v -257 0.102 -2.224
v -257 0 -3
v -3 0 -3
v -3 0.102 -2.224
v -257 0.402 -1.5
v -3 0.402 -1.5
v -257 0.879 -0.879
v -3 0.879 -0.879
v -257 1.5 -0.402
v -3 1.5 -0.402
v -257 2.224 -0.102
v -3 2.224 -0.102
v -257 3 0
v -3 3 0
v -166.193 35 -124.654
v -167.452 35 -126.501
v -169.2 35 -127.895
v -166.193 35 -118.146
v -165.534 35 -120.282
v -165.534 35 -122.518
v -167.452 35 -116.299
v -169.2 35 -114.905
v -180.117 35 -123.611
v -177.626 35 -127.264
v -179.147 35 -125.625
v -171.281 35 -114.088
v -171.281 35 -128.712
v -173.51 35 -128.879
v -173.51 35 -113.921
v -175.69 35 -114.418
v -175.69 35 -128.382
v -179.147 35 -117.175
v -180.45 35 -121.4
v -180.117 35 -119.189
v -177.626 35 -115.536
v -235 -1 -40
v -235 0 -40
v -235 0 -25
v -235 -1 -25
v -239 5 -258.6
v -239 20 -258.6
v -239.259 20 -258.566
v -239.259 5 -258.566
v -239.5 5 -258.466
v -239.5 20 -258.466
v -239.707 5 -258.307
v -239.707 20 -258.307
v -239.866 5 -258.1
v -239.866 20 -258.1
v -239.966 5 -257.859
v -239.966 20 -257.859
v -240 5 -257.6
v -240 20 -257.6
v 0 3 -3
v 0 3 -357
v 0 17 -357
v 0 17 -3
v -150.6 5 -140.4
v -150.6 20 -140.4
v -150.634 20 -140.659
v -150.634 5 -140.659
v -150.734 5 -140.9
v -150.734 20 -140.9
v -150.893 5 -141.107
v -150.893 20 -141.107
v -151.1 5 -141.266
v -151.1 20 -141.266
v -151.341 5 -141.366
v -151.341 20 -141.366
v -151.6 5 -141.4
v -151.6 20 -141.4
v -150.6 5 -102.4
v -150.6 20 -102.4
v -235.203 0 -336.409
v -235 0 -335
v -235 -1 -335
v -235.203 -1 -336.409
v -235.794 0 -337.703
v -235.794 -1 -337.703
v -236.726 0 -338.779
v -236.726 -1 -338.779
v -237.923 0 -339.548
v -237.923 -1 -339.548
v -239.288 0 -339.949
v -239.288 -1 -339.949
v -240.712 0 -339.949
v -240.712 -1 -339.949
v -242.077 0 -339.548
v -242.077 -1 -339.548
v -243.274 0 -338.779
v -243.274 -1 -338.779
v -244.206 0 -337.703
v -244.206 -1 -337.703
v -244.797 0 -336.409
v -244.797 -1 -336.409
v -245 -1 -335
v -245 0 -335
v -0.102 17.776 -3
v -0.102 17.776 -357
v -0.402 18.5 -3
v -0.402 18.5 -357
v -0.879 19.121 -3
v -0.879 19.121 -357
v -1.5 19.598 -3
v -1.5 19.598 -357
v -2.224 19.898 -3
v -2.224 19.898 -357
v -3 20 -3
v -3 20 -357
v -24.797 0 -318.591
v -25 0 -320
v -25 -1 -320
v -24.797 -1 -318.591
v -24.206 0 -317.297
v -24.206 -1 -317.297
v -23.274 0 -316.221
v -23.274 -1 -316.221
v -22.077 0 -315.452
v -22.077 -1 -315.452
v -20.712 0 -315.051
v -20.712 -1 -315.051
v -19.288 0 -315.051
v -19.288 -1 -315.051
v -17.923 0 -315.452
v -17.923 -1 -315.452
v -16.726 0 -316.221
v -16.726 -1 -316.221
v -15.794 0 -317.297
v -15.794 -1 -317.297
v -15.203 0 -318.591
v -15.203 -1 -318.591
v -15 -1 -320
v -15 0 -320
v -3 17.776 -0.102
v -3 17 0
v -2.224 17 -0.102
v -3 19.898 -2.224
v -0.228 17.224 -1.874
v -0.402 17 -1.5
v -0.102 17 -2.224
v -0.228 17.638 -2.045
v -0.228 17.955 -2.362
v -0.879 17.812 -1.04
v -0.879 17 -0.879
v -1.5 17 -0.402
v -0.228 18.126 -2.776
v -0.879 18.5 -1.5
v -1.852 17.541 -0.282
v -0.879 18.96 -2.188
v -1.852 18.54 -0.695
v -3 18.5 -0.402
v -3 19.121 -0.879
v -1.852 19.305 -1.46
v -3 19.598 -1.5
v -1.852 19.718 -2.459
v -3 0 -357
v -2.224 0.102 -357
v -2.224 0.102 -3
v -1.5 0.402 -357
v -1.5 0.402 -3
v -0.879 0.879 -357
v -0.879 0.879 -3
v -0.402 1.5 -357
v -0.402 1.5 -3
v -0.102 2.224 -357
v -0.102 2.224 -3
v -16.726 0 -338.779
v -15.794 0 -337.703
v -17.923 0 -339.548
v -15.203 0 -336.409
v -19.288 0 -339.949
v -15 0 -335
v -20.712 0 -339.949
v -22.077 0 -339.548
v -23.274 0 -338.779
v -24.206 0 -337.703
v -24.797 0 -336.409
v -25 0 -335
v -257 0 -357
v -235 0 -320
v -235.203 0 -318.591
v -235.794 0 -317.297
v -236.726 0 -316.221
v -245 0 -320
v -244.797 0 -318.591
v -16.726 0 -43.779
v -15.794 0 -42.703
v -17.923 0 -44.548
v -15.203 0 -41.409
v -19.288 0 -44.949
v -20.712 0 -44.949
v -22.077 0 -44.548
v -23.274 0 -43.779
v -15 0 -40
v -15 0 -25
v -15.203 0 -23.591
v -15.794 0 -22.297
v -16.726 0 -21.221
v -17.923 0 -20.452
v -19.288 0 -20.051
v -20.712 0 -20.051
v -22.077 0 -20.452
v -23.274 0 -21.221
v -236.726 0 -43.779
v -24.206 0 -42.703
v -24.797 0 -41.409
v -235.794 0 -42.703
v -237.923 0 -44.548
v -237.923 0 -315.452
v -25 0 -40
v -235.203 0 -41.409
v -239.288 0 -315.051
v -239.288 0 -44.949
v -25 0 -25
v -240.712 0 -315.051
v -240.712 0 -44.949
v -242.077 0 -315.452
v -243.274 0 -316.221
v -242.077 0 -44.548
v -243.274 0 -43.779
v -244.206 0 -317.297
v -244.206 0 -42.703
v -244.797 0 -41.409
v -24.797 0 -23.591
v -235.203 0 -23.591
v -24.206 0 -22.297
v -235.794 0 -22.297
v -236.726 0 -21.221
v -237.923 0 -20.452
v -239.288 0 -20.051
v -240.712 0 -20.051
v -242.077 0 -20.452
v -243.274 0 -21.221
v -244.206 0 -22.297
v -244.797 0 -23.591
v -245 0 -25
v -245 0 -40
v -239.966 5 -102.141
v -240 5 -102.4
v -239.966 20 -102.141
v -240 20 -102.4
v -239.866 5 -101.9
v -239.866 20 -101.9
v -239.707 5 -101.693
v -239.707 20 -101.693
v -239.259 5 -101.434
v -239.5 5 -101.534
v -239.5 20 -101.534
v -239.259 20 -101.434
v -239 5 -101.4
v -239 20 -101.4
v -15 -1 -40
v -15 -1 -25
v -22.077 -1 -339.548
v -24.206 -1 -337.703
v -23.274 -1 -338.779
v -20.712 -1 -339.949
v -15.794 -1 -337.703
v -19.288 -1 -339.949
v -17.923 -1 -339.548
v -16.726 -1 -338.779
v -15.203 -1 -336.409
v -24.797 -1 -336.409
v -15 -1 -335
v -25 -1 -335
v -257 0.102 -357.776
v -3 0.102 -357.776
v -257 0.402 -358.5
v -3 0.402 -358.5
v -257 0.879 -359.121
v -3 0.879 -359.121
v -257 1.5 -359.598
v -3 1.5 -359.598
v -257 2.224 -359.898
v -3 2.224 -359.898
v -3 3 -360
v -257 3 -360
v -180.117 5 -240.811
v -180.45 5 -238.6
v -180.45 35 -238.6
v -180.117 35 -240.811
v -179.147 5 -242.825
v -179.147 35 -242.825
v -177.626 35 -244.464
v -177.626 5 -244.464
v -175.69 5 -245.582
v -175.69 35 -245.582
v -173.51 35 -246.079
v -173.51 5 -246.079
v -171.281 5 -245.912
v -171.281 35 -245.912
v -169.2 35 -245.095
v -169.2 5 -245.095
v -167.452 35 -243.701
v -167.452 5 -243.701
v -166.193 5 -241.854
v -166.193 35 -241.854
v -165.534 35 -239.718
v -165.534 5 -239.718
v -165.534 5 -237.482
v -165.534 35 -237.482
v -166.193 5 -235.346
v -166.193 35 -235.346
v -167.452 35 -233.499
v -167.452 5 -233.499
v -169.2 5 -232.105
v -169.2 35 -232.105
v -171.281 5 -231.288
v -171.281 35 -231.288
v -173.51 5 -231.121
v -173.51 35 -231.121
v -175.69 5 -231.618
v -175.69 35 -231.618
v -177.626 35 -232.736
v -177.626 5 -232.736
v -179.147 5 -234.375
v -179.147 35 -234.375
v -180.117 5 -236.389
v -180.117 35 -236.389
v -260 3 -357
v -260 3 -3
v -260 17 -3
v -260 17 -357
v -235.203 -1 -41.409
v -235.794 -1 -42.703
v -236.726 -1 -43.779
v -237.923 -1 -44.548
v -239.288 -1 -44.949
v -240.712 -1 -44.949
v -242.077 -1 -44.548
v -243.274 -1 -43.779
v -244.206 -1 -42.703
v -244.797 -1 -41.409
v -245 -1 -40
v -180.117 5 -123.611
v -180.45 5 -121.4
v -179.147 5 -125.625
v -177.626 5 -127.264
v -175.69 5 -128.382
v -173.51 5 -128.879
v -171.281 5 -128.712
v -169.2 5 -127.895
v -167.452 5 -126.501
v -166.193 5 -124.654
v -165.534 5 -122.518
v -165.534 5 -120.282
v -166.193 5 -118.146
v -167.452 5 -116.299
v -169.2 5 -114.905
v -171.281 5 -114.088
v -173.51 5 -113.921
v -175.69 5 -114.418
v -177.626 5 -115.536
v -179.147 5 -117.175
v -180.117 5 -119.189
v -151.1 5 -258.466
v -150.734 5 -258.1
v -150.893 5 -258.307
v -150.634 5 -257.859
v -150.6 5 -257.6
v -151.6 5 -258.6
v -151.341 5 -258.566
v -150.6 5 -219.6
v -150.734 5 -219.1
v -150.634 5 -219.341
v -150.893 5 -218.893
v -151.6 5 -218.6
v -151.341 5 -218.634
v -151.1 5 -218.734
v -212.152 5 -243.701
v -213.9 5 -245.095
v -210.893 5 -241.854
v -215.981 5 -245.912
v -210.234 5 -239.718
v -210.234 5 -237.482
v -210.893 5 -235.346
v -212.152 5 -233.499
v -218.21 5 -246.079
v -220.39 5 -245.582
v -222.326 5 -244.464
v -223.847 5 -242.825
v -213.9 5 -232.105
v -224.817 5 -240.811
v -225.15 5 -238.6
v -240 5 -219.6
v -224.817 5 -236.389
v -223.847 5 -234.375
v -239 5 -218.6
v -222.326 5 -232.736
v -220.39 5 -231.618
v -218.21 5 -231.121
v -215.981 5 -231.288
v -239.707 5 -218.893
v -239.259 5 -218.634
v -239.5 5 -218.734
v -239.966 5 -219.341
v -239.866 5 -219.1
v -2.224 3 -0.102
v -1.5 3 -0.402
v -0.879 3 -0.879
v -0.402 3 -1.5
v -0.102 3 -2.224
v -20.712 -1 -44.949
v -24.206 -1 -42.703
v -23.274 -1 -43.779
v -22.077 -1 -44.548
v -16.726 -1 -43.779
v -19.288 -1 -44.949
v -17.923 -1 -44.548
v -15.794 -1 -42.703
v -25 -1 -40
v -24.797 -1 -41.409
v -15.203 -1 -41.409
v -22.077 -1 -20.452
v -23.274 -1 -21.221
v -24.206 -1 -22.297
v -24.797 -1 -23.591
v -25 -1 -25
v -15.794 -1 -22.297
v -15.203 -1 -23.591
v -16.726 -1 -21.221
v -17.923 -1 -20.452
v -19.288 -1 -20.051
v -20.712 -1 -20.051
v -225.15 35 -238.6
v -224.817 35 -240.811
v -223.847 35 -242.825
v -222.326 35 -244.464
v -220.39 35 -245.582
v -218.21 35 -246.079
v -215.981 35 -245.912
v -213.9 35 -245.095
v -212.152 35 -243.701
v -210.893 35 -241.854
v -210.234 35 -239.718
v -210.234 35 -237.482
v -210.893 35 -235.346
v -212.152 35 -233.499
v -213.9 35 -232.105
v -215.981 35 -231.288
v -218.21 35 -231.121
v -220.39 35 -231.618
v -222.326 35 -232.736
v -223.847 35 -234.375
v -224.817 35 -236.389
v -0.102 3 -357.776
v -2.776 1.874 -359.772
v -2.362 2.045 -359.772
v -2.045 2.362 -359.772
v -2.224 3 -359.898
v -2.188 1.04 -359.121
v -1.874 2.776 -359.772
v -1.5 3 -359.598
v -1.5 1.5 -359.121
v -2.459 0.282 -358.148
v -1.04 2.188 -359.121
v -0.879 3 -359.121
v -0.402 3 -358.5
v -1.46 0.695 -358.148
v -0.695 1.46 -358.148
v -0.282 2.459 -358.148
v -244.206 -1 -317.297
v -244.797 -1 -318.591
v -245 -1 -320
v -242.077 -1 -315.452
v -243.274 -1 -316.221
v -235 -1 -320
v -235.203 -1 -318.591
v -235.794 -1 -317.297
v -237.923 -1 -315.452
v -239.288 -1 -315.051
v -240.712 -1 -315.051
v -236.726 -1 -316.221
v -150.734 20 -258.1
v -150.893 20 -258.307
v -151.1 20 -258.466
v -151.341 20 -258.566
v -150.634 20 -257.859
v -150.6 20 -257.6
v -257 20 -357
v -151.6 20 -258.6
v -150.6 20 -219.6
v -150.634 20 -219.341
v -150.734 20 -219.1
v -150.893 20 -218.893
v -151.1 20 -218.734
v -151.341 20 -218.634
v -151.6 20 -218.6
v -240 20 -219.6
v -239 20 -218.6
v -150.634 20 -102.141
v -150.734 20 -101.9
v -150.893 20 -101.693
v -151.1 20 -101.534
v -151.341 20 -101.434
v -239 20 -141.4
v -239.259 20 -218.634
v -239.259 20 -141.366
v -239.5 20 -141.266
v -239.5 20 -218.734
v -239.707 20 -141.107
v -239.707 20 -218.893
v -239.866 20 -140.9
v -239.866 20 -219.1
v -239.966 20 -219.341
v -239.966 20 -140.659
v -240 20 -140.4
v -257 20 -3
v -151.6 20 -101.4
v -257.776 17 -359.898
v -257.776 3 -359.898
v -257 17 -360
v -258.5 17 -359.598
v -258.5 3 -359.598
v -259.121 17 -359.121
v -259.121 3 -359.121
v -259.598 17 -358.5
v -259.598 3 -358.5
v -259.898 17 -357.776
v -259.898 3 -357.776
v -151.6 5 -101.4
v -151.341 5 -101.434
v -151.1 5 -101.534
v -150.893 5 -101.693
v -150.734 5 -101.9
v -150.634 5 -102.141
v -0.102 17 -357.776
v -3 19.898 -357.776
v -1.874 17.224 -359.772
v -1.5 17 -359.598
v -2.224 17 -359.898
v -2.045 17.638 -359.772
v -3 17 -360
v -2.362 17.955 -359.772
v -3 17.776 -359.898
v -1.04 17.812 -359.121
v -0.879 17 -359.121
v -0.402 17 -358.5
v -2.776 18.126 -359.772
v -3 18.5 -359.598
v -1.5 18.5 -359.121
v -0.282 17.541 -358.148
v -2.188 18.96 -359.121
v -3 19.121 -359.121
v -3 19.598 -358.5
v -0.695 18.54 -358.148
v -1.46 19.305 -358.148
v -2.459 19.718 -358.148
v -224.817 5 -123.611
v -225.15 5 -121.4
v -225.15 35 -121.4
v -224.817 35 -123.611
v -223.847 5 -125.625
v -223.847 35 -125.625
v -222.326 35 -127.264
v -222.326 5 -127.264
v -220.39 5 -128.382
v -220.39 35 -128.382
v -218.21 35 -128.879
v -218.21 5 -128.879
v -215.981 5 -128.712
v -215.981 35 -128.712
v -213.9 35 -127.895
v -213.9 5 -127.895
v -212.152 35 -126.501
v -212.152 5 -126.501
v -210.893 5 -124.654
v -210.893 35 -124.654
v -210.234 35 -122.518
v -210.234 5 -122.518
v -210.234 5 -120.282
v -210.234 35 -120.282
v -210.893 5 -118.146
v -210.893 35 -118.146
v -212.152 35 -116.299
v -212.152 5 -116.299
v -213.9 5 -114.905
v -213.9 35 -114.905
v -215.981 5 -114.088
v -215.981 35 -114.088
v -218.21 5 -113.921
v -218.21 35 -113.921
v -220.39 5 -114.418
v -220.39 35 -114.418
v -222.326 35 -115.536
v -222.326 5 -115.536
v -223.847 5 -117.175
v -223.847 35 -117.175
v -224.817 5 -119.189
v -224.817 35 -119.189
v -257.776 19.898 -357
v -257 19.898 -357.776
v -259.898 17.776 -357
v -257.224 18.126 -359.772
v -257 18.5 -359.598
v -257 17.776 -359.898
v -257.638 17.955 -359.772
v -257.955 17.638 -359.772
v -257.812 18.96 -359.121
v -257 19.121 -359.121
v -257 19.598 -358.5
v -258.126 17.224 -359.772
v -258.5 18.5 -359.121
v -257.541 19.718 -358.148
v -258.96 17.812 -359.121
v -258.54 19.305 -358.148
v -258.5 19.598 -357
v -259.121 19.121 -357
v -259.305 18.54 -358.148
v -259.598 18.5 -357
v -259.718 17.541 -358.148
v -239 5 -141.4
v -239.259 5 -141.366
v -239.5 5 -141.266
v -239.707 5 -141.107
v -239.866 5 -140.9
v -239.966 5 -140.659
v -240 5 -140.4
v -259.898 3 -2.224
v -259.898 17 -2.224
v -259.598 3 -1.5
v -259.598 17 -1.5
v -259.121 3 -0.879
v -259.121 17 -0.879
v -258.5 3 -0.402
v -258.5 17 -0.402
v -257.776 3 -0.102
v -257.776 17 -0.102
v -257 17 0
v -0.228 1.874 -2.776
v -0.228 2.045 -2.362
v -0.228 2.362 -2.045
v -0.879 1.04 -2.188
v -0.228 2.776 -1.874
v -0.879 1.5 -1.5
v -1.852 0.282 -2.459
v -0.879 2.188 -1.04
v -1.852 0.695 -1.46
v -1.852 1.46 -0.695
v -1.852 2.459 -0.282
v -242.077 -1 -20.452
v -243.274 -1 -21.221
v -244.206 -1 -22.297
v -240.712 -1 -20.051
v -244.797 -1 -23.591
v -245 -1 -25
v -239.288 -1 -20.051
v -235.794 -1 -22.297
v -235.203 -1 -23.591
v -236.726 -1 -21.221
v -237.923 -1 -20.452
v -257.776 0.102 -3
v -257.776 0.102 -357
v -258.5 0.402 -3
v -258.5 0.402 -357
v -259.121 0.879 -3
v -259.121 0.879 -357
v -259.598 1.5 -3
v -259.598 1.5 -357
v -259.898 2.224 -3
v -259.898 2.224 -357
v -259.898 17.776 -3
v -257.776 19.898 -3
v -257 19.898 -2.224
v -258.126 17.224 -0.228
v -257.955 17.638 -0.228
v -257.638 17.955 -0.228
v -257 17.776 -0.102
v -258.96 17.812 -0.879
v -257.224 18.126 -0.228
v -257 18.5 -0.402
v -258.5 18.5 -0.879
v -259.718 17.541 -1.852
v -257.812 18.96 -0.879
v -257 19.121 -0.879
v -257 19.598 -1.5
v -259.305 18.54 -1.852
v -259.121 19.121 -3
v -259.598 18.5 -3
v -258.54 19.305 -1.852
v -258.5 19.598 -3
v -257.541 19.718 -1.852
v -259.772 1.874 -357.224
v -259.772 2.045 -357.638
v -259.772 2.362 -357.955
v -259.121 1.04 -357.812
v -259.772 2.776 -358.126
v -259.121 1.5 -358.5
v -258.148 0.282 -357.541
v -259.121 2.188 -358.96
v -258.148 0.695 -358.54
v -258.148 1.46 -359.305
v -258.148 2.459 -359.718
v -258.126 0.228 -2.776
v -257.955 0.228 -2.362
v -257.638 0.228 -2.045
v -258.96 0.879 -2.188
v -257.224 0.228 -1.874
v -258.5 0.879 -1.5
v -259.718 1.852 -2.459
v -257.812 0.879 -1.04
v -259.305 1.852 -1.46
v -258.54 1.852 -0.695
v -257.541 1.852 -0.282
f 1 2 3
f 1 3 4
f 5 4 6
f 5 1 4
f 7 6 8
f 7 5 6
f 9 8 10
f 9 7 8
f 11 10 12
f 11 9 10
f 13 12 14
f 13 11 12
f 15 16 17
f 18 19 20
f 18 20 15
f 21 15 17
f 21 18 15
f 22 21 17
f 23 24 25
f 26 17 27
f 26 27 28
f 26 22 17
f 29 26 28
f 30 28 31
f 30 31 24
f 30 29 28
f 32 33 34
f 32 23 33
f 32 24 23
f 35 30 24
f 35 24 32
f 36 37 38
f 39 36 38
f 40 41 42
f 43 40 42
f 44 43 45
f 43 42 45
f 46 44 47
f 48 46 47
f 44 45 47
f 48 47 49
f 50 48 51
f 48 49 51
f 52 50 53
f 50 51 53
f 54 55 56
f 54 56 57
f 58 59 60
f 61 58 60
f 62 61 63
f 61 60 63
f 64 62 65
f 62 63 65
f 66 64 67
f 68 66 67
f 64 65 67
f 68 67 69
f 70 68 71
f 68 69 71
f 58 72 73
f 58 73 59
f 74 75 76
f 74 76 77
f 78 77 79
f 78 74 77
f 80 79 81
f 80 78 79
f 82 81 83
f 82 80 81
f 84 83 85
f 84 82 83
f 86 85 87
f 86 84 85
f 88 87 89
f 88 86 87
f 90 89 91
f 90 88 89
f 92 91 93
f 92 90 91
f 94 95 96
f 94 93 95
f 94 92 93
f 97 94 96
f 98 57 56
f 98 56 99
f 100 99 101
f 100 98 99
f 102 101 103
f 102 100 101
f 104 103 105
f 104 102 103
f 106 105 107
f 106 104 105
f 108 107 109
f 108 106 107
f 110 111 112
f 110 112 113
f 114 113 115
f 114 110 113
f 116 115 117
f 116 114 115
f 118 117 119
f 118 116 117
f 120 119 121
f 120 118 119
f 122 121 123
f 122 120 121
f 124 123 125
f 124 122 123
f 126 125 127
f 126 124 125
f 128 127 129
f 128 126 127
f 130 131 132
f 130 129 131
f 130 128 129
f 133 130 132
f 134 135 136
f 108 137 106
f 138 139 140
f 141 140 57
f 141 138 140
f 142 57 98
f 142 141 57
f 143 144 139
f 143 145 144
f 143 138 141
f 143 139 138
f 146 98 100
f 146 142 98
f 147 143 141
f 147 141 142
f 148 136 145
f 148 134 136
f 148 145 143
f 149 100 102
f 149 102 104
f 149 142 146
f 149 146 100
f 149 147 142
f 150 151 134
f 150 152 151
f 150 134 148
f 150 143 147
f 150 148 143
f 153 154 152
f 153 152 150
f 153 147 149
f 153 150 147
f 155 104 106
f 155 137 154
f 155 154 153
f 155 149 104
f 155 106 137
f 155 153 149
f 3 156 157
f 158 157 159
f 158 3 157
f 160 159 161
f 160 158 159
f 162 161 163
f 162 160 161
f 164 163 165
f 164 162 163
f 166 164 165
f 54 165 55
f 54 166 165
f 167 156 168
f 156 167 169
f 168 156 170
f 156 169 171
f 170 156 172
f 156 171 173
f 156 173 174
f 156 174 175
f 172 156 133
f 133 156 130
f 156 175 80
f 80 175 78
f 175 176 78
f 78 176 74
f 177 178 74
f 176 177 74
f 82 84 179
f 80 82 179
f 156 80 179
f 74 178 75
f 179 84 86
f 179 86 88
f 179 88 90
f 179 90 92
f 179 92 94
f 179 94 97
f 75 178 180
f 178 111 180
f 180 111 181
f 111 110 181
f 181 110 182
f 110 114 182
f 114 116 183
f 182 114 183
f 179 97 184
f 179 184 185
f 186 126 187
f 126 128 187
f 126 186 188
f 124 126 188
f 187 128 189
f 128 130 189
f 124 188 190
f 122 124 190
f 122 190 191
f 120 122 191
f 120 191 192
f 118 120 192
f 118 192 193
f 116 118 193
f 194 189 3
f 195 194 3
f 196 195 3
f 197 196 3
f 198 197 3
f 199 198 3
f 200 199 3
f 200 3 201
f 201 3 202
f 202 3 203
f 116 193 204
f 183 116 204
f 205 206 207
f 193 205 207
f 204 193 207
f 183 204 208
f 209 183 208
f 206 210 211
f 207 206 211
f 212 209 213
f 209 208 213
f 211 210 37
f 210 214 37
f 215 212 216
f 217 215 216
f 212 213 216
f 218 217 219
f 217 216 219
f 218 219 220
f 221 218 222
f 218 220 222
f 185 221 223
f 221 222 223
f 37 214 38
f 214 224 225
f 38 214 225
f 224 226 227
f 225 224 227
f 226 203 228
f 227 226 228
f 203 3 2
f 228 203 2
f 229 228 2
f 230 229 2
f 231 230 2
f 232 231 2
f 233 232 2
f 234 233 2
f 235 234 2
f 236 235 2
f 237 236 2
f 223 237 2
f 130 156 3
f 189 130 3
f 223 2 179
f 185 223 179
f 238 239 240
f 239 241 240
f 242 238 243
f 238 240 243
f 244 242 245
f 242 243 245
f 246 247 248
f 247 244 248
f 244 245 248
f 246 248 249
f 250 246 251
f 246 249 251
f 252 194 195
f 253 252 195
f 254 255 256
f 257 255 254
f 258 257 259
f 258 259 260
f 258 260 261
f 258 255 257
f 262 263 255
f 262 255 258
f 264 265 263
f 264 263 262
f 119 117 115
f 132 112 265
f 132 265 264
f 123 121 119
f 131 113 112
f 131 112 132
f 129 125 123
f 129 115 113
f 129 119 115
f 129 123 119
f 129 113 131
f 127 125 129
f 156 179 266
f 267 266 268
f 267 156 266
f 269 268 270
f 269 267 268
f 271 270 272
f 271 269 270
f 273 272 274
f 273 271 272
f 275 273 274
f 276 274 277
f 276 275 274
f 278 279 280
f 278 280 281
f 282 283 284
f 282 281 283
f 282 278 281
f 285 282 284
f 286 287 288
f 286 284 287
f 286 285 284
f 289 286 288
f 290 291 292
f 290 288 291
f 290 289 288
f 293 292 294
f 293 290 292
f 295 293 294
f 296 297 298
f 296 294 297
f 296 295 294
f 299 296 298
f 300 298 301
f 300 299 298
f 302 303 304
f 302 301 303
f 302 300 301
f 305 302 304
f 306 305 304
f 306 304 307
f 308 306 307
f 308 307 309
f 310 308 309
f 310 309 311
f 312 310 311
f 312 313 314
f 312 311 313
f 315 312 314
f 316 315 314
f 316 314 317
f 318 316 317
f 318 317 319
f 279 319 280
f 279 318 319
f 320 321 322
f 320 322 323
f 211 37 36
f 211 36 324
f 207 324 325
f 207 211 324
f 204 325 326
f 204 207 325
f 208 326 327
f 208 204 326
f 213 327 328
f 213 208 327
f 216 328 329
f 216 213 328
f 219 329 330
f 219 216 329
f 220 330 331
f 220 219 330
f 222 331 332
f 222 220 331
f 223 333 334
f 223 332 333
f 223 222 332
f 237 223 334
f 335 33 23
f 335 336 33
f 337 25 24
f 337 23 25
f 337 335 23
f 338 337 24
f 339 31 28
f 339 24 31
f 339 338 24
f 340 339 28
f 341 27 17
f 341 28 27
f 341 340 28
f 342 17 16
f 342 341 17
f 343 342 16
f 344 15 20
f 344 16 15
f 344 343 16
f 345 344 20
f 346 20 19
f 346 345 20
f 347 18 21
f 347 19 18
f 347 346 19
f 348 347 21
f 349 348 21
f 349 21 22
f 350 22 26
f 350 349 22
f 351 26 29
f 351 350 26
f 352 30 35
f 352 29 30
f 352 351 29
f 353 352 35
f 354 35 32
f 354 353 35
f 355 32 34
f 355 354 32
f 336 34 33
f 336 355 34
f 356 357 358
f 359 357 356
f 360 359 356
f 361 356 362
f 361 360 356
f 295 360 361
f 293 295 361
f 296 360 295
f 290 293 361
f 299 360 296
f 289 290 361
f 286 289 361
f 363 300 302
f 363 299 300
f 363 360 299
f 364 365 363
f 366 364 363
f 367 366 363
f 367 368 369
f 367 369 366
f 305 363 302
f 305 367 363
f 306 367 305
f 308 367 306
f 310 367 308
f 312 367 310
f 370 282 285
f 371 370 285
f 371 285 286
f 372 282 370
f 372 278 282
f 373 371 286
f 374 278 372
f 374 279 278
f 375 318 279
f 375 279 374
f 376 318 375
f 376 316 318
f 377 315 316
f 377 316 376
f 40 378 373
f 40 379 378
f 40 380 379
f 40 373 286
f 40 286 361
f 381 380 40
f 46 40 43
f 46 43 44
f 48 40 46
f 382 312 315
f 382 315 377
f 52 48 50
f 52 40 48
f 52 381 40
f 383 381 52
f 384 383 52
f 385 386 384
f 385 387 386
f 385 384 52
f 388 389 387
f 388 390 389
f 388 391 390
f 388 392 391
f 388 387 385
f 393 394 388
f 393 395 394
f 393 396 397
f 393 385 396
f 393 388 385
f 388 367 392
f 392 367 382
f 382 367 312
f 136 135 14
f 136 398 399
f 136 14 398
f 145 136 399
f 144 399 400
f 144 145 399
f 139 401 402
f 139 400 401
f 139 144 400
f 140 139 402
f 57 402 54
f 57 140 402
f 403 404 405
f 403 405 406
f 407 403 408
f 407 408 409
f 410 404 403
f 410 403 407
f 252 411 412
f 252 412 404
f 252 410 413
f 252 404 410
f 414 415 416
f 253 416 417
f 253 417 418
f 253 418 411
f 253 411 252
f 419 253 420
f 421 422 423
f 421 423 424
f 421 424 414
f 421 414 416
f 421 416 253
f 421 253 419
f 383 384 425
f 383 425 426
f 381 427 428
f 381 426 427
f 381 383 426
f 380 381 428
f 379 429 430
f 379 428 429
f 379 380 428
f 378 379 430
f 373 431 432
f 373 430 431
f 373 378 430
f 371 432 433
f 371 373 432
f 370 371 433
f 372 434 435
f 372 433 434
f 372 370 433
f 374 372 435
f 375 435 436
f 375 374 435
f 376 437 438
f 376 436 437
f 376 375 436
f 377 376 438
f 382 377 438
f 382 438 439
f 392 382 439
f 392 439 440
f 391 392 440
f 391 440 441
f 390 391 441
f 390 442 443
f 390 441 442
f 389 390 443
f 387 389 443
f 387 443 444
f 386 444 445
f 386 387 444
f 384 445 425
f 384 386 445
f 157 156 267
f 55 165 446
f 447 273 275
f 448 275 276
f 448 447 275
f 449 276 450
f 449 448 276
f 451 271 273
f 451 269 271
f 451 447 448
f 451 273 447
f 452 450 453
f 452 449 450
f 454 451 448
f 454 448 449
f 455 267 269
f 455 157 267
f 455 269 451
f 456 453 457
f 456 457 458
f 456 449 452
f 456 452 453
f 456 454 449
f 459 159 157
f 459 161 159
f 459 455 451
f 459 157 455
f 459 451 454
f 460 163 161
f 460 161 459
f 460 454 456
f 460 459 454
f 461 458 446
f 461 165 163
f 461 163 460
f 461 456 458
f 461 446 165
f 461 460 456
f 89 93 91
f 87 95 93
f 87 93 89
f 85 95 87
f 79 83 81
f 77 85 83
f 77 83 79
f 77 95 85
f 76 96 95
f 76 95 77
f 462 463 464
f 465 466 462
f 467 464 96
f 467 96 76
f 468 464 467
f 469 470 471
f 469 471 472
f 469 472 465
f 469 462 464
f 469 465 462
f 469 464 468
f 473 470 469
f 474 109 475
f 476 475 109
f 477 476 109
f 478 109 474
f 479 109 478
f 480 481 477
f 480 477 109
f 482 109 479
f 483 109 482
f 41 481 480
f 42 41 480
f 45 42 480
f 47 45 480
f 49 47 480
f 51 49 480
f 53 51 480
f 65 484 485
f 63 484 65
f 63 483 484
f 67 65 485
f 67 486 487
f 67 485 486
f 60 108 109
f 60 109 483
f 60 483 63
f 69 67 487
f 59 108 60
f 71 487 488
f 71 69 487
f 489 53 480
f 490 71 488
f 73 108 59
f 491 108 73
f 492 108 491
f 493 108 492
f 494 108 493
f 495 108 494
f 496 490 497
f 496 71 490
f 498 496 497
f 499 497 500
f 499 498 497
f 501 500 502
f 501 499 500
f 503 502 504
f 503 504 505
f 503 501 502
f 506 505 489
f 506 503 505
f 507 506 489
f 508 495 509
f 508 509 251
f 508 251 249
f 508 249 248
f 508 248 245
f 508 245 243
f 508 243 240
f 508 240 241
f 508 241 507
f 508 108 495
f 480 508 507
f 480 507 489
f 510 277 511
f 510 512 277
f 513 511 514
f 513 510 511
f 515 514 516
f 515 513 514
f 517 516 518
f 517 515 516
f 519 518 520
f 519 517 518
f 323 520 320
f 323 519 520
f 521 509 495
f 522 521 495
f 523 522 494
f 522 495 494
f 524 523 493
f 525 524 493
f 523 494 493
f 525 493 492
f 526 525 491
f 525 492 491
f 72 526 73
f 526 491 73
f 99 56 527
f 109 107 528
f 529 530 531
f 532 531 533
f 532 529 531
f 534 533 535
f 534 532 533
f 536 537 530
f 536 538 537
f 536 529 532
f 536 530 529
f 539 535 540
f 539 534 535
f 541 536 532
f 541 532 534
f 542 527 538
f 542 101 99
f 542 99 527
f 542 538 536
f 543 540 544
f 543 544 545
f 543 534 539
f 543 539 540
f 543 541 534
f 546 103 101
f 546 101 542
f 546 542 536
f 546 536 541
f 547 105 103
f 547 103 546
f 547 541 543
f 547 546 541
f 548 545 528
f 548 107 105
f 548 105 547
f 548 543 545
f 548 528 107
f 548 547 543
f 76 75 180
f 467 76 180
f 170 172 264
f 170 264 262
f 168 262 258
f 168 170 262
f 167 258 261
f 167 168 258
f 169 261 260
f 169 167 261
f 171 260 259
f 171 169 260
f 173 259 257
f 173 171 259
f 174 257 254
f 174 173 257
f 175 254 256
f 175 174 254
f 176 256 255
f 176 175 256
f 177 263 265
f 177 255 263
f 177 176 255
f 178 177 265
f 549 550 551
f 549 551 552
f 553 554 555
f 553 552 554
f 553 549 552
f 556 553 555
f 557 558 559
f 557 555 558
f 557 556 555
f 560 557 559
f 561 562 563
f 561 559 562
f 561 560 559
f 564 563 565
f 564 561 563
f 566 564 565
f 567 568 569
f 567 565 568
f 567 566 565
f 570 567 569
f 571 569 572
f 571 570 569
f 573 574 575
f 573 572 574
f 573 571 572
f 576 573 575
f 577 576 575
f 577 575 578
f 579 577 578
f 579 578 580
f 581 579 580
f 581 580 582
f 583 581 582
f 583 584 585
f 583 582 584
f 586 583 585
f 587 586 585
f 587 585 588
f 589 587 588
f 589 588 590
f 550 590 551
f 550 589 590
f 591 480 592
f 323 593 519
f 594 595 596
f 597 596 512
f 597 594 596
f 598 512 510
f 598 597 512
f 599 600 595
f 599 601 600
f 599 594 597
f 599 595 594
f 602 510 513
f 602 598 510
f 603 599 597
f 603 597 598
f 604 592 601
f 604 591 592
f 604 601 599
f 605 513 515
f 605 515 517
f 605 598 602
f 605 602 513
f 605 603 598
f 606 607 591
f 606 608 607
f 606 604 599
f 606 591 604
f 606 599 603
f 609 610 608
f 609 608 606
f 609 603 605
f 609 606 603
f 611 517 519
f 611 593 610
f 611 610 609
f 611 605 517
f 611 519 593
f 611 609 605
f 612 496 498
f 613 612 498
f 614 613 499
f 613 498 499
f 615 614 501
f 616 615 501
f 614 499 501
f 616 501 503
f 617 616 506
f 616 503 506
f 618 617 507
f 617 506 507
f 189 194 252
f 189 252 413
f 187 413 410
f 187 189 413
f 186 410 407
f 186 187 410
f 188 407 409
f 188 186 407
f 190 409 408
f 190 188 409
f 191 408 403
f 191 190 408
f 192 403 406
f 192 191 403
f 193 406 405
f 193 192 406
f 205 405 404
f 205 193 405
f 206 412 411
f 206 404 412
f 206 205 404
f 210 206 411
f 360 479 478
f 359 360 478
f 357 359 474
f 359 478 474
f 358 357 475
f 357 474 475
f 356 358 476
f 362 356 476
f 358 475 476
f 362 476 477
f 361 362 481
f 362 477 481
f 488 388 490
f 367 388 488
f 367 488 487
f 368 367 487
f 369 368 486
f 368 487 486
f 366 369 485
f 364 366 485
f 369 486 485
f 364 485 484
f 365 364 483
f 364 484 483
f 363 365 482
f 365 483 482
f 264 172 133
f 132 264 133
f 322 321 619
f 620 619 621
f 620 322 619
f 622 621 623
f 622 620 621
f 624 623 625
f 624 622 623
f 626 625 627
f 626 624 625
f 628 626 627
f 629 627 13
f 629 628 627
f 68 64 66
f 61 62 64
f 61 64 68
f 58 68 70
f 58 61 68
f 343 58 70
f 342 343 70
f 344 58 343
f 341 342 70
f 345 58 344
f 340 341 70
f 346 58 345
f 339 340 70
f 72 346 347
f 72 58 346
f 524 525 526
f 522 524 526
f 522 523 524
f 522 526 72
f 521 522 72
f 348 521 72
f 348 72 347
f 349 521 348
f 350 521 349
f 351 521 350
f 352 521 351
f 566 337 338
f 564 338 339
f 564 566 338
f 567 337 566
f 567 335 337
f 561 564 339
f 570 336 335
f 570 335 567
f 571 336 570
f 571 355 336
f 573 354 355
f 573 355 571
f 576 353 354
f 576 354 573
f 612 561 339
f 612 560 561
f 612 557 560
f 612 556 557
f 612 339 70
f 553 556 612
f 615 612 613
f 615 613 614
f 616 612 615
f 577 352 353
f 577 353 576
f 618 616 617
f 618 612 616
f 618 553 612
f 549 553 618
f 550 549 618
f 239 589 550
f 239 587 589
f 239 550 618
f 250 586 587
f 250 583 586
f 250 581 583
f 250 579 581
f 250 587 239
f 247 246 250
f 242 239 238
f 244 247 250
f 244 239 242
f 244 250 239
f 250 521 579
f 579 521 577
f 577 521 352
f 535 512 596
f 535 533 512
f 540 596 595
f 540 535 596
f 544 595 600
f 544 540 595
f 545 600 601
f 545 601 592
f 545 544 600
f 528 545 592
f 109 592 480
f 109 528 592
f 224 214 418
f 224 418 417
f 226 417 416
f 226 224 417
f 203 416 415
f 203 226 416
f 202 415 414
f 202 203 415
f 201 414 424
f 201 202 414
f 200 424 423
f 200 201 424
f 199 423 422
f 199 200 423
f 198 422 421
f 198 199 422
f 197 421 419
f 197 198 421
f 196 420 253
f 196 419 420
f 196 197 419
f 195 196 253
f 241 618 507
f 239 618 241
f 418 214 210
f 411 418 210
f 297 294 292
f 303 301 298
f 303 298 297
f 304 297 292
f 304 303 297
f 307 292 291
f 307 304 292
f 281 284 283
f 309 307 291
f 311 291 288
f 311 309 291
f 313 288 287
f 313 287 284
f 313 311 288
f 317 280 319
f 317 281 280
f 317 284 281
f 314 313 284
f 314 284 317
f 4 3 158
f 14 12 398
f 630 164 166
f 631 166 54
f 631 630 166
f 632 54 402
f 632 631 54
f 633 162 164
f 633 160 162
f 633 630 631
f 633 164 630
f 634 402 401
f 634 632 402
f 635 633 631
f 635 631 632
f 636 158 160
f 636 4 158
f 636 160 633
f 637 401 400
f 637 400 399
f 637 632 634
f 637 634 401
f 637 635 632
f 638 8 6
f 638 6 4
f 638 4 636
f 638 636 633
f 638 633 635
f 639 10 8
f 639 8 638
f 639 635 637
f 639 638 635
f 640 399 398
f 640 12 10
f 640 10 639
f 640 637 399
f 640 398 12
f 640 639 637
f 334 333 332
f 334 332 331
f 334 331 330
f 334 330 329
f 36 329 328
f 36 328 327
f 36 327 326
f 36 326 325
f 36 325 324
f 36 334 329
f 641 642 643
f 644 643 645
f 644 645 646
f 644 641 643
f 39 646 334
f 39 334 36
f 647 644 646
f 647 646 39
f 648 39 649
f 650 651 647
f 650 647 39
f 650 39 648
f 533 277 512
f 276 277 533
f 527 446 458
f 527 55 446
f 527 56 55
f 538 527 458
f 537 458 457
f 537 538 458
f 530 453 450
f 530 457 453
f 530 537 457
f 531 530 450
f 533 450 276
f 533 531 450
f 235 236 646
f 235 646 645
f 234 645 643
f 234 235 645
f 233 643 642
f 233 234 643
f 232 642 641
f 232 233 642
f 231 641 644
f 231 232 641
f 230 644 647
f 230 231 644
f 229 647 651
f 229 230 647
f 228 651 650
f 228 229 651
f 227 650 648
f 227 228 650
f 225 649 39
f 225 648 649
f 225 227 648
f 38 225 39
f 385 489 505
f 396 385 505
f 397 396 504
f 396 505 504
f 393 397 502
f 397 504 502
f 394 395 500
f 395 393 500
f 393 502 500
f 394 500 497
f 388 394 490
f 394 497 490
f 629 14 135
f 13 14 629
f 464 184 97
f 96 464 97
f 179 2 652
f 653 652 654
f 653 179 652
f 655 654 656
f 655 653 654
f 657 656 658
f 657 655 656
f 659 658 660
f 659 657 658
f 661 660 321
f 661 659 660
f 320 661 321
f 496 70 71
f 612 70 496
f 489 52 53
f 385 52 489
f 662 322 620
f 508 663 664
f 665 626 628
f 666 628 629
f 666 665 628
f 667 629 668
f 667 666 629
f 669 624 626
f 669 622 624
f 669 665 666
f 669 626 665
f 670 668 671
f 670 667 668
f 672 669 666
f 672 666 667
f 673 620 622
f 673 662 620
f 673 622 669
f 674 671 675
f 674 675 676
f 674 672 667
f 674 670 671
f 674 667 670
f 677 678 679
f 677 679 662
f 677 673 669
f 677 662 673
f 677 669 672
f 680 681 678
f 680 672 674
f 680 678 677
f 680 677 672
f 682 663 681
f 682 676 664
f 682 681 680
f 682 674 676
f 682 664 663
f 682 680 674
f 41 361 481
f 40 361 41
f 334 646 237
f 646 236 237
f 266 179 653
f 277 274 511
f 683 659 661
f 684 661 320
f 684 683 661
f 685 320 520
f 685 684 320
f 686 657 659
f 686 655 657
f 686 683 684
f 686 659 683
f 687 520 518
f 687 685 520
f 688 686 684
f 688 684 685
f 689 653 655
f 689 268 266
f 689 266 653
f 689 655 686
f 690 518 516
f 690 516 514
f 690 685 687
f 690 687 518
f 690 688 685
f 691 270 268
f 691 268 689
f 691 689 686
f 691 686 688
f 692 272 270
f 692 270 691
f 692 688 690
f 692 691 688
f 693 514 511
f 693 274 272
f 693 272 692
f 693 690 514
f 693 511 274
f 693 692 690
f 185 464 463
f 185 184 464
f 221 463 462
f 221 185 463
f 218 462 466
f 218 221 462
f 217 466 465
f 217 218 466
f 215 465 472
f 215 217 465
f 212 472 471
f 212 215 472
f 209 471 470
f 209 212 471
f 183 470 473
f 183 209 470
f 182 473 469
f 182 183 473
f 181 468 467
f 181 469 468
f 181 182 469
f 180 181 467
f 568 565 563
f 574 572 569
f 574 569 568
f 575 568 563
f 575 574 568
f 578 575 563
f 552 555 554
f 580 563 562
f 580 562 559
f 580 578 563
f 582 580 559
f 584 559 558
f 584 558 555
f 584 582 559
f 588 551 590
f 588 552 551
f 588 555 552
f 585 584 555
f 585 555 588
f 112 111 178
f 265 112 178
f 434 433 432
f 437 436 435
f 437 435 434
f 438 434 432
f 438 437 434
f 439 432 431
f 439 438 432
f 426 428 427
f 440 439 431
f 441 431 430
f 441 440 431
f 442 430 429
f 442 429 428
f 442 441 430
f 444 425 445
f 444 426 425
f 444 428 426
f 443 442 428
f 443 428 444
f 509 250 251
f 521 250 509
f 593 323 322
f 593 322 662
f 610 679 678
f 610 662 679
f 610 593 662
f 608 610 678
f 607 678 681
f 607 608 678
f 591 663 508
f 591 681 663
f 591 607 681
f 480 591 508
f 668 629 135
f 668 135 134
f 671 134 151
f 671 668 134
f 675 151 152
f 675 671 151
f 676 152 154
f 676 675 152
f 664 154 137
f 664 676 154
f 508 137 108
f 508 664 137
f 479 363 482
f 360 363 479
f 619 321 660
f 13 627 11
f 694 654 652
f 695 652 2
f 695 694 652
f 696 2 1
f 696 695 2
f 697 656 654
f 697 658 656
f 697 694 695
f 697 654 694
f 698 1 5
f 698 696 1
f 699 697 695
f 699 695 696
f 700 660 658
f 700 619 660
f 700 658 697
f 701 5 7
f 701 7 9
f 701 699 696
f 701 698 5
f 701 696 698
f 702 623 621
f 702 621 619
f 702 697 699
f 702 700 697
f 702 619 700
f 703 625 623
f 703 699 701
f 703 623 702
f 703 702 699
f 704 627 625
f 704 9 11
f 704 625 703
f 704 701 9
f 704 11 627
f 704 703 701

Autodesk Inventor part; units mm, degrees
ref_plane "YZ Plane" through (0, 0, 0) normal (1, 0, 0) x (0, 1, 0)
ref_plane "XZ Plane" through (0, 0, 0) normal (0, 1, 0) x (-1, 0, 0)
ref_plane "XY Plane" through (0, 0, 0) normal (0, 0, 1) x (1, 0, 0)
sketch "Sketch1" plane through (0, 0, 0) normal (0, 1, 0) x (-1, 0, 0)
  line L0 (0, 0) -> (260, 0)
  line L1 (260, 0) -> (260, -360)
  line L2 (260, -360) -> (0, -360)
  line L3 (0, -360) -> (0, 0)
  line L4 (240, -101.4) -> (150.6, -101.4)
  line L5 (150.6, -101.4) -> (150.6, -141.4)
  line L6 (150.6, -141.4) -> (240, -141.4)
  line L7 (240, -141.4) -> (240, -101.4)
  line L8 (240, -218.6) -> (150.6, -218.6)
  line L9 (150.6, -218.6) -> (150.6, -258.6)
  line L10 (150.6, -258.6) -> (240, -258.6)
  line L11 (240, -258.6) -> (240, -218.6)
  circle A0 centre (217.65, -121.4) radius 7.5
  circle A1 centre (172.95, -121.4) radius 7.5
  circle A2 centre (217.65, -238.6) radius 7.5
  circle A3 centre (172.95, -238.6) radius 7.5
  point P0 (240, -121.4)
  point P1 (150.6, -238.6)
  point P2 (240, -238.6)
  dimension "d0" = 260
  dimension "d1" = 360
  dimension "d2" = 89.4
  dimension "d3" = 40
  dimension "d4" = 89.4
  dimension "d5" = 40
  dimension "d8" = 15
  dimension "d9" = 15
  dimension "d11" = 22.35
  dimension "d12" = 15
  dimension "d13" = 15
  dimension "d14" = 22.35
  dimension "d15" = 22.35
  dimension "d16" = 22.35
  dimension "d17" = 20
  dimension "d61" = 117.2
  dimension "d62" = 101.4
  dimension "d63" = 101.4
extrude "Extrusion1" add sketch "Sketch1" along normal blind 20 contours L0 L1 L2 L3
extrude "Extrusion2" add sketch "Sketch1" along normal blind 5 contours L7 L6 L5 L4 | L11 L10 L9 L8
extrude "Extrusion3" add sketch "Sketch1" along normal blind 35 contours A0 | A1 | A2 | A3
sketch "Sketch2" plane through (0, 20, 0) normal (0, 1, 0) x (1, 0, 0)
  point P0 (0, 0)
sketch "Sketch4" plane through (0, 0, 0) normal (0, -1, 0) x (1, 0, 0)
  line L0 (-240, -335) -> (-240, -320) construction
  line L1 (-235, -335) -> (-235, -320)
  line L2 (-245, -320) -> (-245, -335)
  arc A0 (-245, -335) -> (-235, -335) centre (-240, -335) ccw
  arc A1 (-235, -320) -> (-245, -320) centre (-240, -320) ccw
  line L3 (-260, -360) -> (-260, 0) projected
  line L4 (0, -360) -> (-260, -360) projected
  line L5 (-240, -40) -> (-240, -25) construction
  line L6 (-235, -40) -> (-235, -25)
  line L7 (-245, -25) -> (-245, -40)
  arc A2 (-245, -40) -> (-235, -40) centre (-240, -40) ccw
  arc A3 (-235, -25) -> (-245, -25) centre (-240, -25) ccw
  line L8 (-20, -40) -> (-20, -25) construction
  line L9 (-15, -40) -> (-15, -25)
  line L10 (-25, -25) -> (-25, -40)
  arc A4 (-25, -40) -> (-15, -40) centre (-20, -40) ccw
  arc A5 (-15, -25) -> (-25, -25) centre (-20, -25) ccw
  line L11 (-20, -335) -> (-20, -320) construction
  line L12 (-15, -335) -> (-15, -320)
  line L13 (-25, -320) -> (-25, -335)
  arc A6 (-25, -335) -> (-15, -335) centre (-20, -335) ccw
  arc A7 (-15, -320) -> (-25, -320) centre (-20, -320) ccw
  line L14 (0, 0) -> (0, -360) projected
  line L15 (-260, 0) -> (0, 0) projected
  point P0 (-240, -327.5)
  point P1 (-240, -340)
  point P2 (-240, -32.5)
  point P3 (-240, -45)
  point P4 (-20, -32.5)
  point P5 (-20, -45)
  point P6 (-20, -327.5)
  point P7 (-20, -340)
  point P8 (-20, -20)
  point P9 (-240, -20)
  dimension "d39" = 15
  dimension "d40" = 10
  dimension "d41" = 20
  dimension "d42" = 20
  dimension "d43" = 15
  dimension "d44" = 10
  dimension "d45" = 15
  dimension "d46" = 10
  dimension "d47" = 15
  dimension "d48" = 10
  dimension "d49" = 20
  dimension "d50" = 20
  dimension "d51" = 20
  dimension "d52" = 20
  dimension "d53" = 20
  dimension "d54" = 20
extrude "Extrusion5" add sketch "Sketch4" along normal blind 1 contours A0 L2 A1 L1 | A2 L7 A3 L6 | A4 L10 A5 L9 | A6 L13 A7 L12
fillet "Fillet1" radius 3 12 edges at (-260, 20, -180) (-130, 20, 0) (-260, 10, 0) (-130, 0, 0) (0, 10, 0) (0, 20, -180) (0, 0, -180) (-130, 0, -360) (-130, 20, -360) (0, 10, -360) (-260, 10, -360) (-260, 0, -180)
fillet "Fillet2" radius 1 8 edges at (-240, 12.5, -258.6) (-240, 12.5, -218.6) (-150.6, 12.5, -218.6) (-150.6, 12.5, -258.6) (-240, 12.5, -141.4) (-150.6, 12.5, -141.4) (-150.6, 12.5, -101.4) (-240, 12.5, -101.4)
properties part number "base2"
